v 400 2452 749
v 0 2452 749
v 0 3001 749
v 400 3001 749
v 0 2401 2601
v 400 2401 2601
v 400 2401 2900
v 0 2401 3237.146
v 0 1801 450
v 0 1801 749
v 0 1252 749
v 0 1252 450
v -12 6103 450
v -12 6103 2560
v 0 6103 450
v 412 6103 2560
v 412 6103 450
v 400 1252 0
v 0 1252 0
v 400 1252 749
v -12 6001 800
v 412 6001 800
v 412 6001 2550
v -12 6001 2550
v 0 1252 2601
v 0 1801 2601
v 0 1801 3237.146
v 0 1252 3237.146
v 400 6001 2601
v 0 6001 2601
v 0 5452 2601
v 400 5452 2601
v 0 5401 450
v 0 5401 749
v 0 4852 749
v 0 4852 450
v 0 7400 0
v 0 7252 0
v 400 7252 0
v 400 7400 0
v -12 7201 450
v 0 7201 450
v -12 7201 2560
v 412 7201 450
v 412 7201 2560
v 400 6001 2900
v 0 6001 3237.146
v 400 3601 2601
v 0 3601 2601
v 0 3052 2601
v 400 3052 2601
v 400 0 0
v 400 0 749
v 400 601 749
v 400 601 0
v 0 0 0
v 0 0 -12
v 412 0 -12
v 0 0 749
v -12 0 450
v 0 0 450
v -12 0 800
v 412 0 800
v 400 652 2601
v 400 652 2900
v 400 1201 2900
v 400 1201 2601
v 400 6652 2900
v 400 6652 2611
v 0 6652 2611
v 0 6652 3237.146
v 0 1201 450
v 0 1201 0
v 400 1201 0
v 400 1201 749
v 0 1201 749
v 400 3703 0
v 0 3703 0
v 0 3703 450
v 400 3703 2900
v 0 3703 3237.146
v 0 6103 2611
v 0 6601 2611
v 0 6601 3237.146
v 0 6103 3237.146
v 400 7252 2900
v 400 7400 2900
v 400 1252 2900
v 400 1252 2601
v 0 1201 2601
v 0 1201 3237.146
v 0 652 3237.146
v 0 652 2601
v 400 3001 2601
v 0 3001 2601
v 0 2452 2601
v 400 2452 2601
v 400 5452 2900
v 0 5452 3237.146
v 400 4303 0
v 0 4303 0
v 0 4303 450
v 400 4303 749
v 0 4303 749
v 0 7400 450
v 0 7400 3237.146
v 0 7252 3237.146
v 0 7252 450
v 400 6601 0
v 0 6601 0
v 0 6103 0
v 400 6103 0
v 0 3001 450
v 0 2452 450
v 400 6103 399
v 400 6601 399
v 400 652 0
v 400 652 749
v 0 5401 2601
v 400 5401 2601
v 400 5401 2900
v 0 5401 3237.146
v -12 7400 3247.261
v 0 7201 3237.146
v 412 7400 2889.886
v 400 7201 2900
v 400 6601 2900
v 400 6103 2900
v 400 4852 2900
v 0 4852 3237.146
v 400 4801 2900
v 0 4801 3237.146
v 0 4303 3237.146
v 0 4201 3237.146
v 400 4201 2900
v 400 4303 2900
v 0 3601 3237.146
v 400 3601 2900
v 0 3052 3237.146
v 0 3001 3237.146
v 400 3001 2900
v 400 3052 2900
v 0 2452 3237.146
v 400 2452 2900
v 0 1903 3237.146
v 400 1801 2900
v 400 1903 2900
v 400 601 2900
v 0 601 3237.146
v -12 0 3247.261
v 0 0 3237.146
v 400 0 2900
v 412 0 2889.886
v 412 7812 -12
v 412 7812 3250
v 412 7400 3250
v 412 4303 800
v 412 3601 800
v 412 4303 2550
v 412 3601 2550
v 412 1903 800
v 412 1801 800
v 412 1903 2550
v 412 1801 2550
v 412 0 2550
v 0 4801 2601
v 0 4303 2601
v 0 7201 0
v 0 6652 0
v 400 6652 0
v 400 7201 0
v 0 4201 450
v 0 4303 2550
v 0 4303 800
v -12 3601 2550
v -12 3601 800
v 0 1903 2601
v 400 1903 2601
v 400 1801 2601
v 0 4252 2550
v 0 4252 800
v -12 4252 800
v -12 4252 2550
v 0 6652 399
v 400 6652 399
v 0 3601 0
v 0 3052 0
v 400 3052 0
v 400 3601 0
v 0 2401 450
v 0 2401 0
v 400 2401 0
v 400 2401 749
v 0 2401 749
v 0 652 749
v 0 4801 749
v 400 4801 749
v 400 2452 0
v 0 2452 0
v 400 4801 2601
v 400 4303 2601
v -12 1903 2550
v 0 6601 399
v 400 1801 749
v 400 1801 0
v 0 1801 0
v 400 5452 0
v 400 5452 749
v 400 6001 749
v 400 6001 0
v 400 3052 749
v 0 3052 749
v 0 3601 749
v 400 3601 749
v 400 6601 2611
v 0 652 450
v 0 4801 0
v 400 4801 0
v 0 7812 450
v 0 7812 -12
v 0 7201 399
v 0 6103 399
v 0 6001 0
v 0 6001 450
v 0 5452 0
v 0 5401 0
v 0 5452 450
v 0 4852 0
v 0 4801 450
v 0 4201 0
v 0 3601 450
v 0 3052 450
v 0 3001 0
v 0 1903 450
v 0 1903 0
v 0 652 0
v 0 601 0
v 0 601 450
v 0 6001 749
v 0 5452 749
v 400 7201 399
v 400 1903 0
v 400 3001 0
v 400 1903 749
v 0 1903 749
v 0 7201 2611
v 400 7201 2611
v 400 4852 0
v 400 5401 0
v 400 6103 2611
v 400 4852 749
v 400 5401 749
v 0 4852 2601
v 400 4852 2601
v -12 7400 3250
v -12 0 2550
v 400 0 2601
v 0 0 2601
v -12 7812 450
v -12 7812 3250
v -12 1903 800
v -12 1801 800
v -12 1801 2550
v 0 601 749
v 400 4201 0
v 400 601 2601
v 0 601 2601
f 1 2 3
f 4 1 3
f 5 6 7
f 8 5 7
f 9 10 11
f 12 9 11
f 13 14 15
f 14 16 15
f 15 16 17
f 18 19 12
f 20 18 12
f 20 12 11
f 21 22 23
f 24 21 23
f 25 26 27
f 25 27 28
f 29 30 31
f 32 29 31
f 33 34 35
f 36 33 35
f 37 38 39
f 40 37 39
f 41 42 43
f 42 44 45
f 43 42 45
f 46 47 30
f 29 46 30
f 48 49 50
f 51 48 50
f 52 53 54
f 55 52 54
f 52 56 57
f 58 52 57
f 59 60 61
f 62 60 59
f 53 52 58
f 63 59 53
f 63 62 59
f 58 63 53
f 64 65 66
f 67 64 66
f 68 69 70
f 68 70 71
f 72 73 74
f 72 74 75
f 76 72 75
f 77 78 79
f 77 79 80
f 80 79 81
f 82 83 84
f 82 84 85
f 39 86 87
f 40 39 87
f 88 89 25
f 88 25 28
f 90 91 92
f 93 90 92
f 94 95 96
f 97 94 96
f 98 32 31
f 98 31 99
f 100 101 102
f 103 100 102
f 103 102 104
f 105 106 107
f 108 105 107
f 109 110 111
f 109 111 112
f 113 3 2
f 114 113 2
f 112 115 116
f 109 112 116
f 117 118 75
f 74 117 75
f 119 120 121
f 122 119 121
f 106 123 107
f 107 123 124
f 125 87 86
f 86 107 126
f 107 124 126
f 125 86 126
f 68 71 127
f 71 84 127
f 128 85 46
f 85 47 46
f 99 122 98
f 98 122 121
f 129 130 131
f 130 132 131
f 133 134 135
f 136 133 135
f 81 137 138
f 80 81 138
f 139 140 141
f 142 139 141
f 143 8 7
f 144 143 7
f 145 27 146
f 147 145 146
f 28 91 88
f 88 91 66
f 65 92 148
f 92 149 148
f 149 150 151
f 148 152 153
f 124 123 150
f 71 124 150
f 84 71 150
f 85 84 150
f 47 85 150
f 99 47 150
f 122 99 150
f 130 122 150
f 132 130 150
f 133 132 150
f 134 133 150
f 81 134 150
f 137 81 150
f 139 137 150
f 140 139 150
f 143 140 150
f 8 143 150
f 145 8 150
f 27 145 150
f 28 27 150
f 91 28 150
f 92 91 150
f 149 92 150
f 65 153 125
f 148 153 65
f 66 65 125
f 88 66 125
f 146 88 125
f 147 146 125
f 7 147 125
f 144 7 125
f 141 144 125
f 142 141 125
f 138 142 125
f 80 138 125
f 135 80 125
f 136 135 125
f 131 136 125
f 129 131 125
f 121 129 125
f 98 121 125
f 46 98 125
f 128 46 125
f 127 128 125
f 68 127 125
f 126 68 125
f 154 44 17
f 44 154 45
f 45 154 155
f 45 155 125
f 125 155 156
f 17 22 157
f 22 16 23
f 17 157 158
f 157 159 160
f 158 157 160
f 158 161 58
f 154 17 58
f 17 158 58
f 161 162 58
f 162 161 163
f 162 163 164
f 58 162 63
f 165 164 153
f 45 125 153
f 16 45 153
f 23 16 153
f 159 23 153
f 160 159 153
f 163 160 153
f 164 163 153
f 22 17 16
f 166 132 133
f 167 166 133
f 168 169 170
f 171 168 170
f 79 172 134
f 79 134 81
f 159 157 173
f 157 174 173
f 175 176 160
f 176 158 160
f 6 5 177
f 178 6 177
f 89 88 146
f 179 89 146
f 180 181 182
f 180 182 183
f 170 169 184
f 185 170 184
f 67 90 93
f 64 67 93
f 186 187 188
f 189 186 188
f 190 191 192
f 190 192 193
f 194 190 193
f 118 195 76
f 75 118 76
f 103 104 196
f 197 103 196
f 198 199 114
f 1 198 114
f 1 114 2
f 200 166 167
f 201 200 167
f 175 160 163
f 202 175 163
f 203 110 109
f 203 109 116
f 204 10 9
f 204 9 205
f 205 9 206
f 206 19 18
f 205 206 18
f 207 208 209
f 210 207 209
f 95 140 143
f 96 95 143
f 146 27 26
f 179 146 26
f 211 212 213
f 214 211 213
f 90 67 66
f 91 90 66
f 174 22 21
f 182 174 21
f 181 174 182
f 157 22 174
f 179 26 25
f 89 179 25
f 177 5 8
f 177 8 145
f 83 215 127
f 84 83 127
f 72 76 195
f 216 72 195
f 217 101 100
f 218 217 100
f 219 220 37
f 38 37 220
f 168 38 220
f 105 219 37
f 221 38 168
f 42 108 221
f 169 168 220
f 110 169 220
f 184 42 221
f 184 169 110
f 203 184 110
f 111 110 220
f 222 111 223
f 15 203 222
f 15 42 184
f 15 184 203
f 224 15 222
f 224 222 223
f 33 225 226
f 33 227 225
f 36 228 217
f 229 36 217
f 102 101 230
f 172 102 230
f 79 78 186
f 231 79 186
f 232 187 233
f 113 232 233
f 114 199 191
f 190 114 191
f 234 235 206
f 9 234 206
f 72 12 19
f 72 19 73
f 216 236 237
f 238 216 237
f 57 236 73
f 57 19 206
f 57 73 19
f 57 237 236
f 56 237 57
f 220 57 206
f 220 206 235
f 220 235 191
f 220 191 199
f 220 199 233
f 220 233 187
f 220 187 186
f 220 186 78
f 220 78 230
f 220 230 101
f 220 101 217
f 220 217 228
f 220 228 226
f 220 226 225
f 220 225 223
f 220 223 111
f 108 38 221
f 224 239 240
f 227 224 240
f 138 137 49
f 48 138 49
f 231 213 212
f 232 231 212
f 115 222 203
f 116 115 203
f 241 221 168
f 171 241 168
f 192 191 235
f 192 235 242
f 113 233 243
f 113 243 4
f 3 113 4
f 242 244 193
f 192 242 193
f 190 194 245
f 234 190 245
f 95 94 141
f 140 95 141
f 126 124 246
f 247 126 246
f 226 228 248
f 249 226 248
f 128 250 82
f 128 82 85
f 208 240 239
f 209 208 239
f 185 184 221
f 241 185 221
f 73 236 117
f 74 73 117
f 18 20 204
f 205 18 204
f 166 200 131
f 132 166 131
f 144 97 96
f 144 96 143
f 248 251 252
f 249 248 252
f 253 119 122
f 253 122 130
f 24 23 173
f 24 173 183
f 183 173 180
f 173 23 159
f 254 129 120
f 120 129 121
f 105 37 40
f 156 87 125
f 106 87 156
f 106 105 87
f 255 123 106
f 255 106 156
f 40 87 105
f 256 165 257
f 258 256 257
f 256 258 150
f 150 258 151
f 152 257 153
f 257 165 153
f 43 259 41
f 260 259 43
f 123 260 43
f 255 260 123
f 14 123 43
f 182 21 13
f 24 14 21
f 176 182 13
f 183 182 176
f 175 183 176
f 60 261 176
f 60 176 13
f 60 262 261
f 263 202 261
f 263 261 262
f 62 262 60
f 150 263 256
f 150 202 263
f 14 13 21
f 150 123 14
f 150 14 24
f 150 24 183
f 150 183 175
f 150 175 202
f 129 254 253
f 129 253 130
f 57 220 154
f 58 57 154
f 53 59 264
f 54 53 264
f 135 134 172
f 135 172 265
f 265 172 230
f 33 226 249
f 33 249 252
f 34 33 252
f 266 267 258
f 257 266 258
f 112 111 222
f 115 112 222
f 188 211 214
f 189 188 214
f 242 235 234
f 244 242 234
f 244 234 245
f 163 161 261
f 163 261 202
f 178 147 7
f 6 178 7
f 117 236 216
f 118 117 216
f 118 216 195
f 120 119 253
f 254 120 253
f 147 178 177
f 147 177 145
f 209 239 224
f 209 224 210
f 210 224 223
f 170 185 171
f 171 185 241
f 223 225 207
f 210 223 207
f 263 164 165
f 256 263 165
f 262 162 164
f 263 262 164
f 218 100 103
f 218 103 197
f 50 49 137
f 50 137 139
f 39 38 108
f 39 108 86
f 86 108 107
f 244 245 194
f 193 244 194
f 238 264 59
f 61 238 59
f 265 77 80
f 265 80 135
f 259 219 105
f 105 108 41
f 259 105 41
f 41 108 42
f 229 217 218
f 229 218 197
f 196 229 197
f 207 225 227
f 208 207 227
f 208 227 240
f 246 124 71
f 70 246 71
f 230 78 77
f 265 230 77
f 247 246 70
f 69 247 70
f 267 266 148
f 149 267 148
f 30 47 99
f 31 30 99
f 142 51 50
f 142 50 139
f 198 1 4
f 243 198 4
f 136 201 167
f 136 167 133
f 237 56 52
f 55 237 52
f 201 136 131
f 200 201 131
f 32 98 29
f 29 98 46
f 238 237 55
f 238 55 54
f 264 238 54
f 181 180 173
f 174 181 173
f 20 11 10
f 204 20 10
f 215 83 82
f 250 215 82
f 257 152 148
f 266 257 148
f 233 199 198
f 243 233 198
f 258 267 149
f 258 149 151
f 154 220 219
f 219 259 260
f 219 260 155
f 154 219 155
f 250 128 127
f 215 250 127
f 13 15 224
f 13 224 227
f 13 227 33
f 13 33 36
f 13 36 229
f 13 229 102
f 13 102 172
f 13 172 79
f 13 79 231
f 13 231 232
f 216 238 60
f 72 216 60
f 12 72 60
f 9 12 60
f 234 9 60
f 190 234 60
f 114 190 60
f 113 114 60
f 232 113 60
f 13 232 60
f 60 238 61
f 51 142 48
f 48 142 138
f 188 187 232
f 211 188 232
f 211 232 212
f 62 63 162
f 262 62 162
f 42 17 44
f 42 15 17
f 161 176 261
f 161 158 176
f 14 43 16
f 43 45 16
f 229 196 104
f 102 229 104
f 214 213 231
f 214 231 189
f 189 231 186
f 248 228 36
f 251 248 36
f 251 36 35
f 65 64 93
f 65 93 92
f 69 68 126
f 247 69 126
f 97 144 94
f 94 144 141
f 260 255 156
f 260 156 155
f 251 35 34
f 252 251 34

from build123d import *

# Parameters (mm, degrees)
F0_W     = 51
F0_H     = 649
F0_H_2   = 749
F0_H_3   = 3250
F1_DEPTH = 400
F0_H_4   = 399
F0_H_5   = 639
F0_H_6   = 51
F0_H_7   = 1750
F0_W_2   = 412
F2_W     = 601
F2_H     = 749
F2_W_2   = 549
F2_W_3   = 498
F2_H_2   = 649
F2_W_4   = 1698
F2_H_3   = 1750
F2_W_5   = 4109
F2_H_4   = 3250
F2_W_6   = 1098
F2_H_5   = 2110
F3_DEPTH = 12
F4_W     = 549
F4_H     = 649
F4_W_2   = 498
F4_W_3   = 601
F4_H_2   = 299
F4_W_4   = 1749
F4_H_3   = 1750
F4_W_5   = 1698
F5_DEPTH = 12
F6_W     = 412
F6_H     = 7812
F7_DEPTH = 12
F9_DEPTH = 7400


# Not quite as in the source:
# - a feature names something its author has since deleted; it is built from what else it names


with BuildPart() as f1:
    # F0 (on Right) → F1 (new body)
    with BuildSketch(Plane.YZ):
        with Locations((626.5, 2925.5)):
            Rectangle(F0_W, F0_H)
        with Locations((1226.5, 374.5)):
            Rectangle(F0_W, F0_H_2)
        with Locations((3026.5, 374.5)):
            Rectangle(F0_W, F0_H_2)
        with Locations((1226.5, 2925.5)):
            Rectangle(F0_W, F0_H)
        Polygon((1801, 2550), (1801, 800), (1801, 749), (1801, 0), (1852, 0), (1852, 3250), (1801, 3250), (1801, 2601), align=None)
        with Locations((3026.5, 2925.5)):
            Rectangle(F0_W, F0_H)
        Polygon((3601, 2550), (3601, 800), (3601, 749), (3601, 0), (3652, 0), (3652, 3250), (3601, 3250), (3601, 2601), align=None)
        Polygon((0, 800), (0, 749), (601, 749), (652, 749), (1201, 749), (1252, 749), (1801, 749), (1801, 800), align=None)
        Polygon((0, 2601), (0, 2550), (1801, 2550), (1801, 2601), (1252, 2601), (1201, 2601), (652, 2601), (601, 2601), align=None)
        with Locations((626.5, 374.5)):
            Rectangle(F0_W, F0_H_2)
        Polygon((1852, 3250), (1852, 0), (1903, 0), (1903, 749), (1903, 800), (1903, 2550), (1903, 2601), (1903, 3250), align=None)
        Polygon((1903, 800), (1903, 749), (2401, 749), (2452, 749), (3001, 749), (3052, 749), (3601, 749), (3601, 800), align=None)
        with Locations((2426.5, 374.5)):
            Rectangle(F0_W, F0_H_2)
        with Locations((2426.5, 2925.5)):
            Rectangle(F0_W, F0_H)
        Polygon((2401, 2601), (1903, 2601), (1903, 2550), (3601, 2550), (3601, 2601), (3052, 2601), (3001, 2601), (2452, 2601), align=None)
        with Locations((3677.5, 1625)):
            Rectangle(F0_W, F0_H_3)
    extrude(amount=F1_DEPTH)



with BuildPart() as f1b:
    # F0 (on Right) → F1, piece 2 (new body)
    with BuildSketch(Plane.YZ):
        with Locations((4826.5, 374.5)):
            Rectangle(F0_W, F0_H_2)
        Polygon((6001, 2550), (6001, 800), (6001, 749), (6001, 0), (6052, 0), (6052, 749), (6052, 2601), (6052, 3250), (6001, 3250), (6001, 2601), align=None)
        with Locations((6626.5, 199.5)):
            Rectangle(F0_W, F0_H_4)
        with Locations((6626.5, 2930.5)):
            Rectangle(F0_W, F0_H_5)
        Polygon((4201, 3250), (4201, 0), (4252, 0), (4252, 749), (4252, 800), (4252, 2550), (4252, 2601), (4252, 3250), align=None)
        with Locations((5426.5, 2925.5)):
            Rectangle(F0_W, F0_H)
        Polygon((7201, 399), (7201, 0), (7252, 0), (7252, 3250), (7201, 3250), (7201, 2611), (7201, 2560), (7201, 450), align=None)
        with Locations((4277.5, 774.5)):
            Rectangle(F0_W, F0_H_6)
        Polygon((4303, 800), (4303, 749), (4801, 749), (4852, 749), (5401, 749), (5452, 749), (6001, 749), (6001, 800), align=None)
        Polygon((6601, 2611), (6103, 2611), (6103, 2560), (7201, 2560), (7201, 2611), (6652, 2611), align=None)
        Polygon((6103, 450), (6103, 399), (6601, 399), (6652, 399), (7201, 399), (7201, 450), align=None)
        with Locations((5426.5, 374.5)):
            Rectangle(F0_W, F0_H_2)
        Polygon((6052, 749), (6052, 0), (6103, 0), (6103, 399), (6103, 450), (6103, 2560), (6103, 2611), (6103, 3250), (6052, 3250), (6052, 2601), align=None)
        with Locations((4826.5, 2925.5)):
            Rectangle(F0_W, F0_H)
        Polygon((4801, 2601), (4303, 2601), (4303, 2550), (6001, 2550), (6001, 2601), (5452, 2601), (5401, 2601), (4852, 2601), align=None)
        with Locations((4277.5, 2925.5)):
            Rectangle(F0_W, F0_H)
        with Locations((4277.5, 1675)):
            Rectangle(F0_W, F0_H_7)
        with Locations((4277.5, 2575.5)):
            Rectangle(F0_W, F0_H_6)
        with Locations((4277.5, 374.5)):
            Rectangle(F0_W, F0_H_2)
    extrude(amount=F1_DEPTH)


with BuildPart() as f1c:
    # F0 (on Right) → F1, piece 3 (new body)
    with BuildSketch(Plane.YZ):
        with Locations((7606, 1625)):
            Rectangle(F0_W_2, F0_H_3)
    extrude(amount=F1_DEPTH)


with BuildPart() as f1_1:
    add(f1.part)

    add(f1b.part)  # F3 merges F1b

    add(f1c.part)  # F3 merges F1c
    # F2 (on face) → F3 (join)
    with BuildSketch(Plane.YZ.offset(400)):
        with Locations((300.5, 374.5)):
            Rectangle(F2_W, F2_H)
        with Locations((926.5, 374.5)):
            Rectangle(F2_W_2, F2_H)
        with Locations((1526.5, 374.5)):
            Rectangle(F2_W_2, F2_H)
        with Locations((2152, 374.5)):
            Rectangle(F2_W_3, F2_H)
        with Locations((2726.5, 374.5)):
            Rectangle(F2_W_2, F2_H)
        with Locations((3326.5, 374.5)):
            Rectangle(F2_W_2, F2_H)
        with Locations((300.5, 2925.5)):
            Rectangle(F2_W, F2_H_2)
        with Locations((926.5, 2925.5)):
            Rectangle(F2_W_2, F2_H_2)
        with Locations((1526.5, 2925.5)):
            Rectangle(F2_W_2, F2_H_2)
        with Locations((2152, 2925.5)):
            Rectangle(F2_W_3, F2_H_2)
        with Locations((2726.5, 2925.5)):
            Rectangle(F2_W_2, F2_H_2)
        with Locations((3326.5, 2925.5)):
            Rectangle(F2_W_2, F2_H_2)
        Polygon((601, 749), (601, 0), (652, 0), (652, 749), (1201, 749), (1201, 0), (1252, 0), (1252, 749), (1801, 749), (1801, 0), (1903, 0), (1903, 749), (2401, 749), (2401, 0), (2452, 0), (2452, 749), (3001, 749), (3001, 0), (3052, 0), (3052, 749), (3601, 749), (3601, 0), (3703, 0), (3703, 3250), (3601, 3250), (3601, 2601), (3052, 2601), (3052, 3250), (3001, 3250), (3001, 2601), (2452, 2601), (2452, 3250), (2401, 3250), (2401, 2601), (1903, 2601), (1903, 3250), (1801, 3250), (1801, 2601), (1252, 2601), (1252, 3250), (1201, 3250), (1201, 2601), (652, 2601), (652, 3250), (601, 3250), (601, 2601), (0, 2601), (0, 2550), (1801, 2550), (1801, 800), (0, 800), (0, 749), align=None)
        with Locations((2752, 1675)):
            Rectangle(F2_W_4, F2_H_3, mode=Mode.SUBTRACT)
        with Locations((5757.5, 1625)):
            Rectangle(F2_W_5, F2_H_4)
        with Locations((6652, 1505)):
            Rectangle(F2_W_6, F2_H_5, mode=Mode.SUBTRACT)
        with Locations((5152, 1675)):
            Rectangle(F2_W_4, F2_H_3, mode=Mode.SUBTRACT)
    extrude(amount=F3_DEPTH)

    # F4 (on face) → F5 (join)
    with BuildSketch(Plane(origin=(0, 0, 0), x_dir=(0, -1, 0), z_dir=(-1, 0, 0))):
        with Locations((-3326.5, 2925.5)):
            Rectangle(F4_W, F4_H)
        with Locations((-2726.5, 2925.5)):
            Rectangle(F4_W, F4_H)
        with Locations((-2152, 2925.5)):
            Rectangle(F4_W_2, F4_H)
        with Locations((-1526.5, 2925.5)):
            Rectangle(F4_W, F4_H)
        with Locations((-926.5, 2925.5)):
            Rectangle(F4_W, F4_H)
        with Locations((-300.5, 2925.5)):
            Rectangle(F4_W_3, F4_H)
        with Locations((-300.5, 599.5)):
            Rectangle(F4_W_3, F4_H_2)
        Polygon((-3703, 450), (-3703, 3250), (-7812, 3250), (-7812, 450), (-7201, 450), (-7201, 2560), (-6103, 2560), (-6103, 450), align=None)
        with Locations((-5126.5, 1675)):
            Rectangle(F4_W_4, F4_H_3, mode=Mode.SUBTRACT)
        with Locations((-3326.5, 599.5)):
            Rectangle(F4_W, F4_H_2)
        with Locations((-2726.5, 599.5)):
            Rectangle(F4_W, F4_H_2)
        with Locations((-2152, 599.5)):
            Rectangle(F4_W_2, F4_H_2)
        with Locations((-1526.5, 599.5)):
            Rectangle(F4_W, F4_H_2)
        with Locations((-926.5, 599.5)):
            Rectangle(F4_W, F4_H_2)
        Polygon((-1801, 800), (-1801, 2550), (0, 2550), (0, 2601), (-601, 2601), (-601, 3250), (-652, 3250), (-652, 2601), (-1201, 2601), (-1201, 3250), (-1252, 3250), (-1252, 2601), (-1801, 2601), (-1801, 3250), (-1903, 3250), (-1903, 2601), (-2401, 2601), (-2401, 3250), (-2452, 3250), (-2452, 2601), (-3001, 2601), (-3001, 3250), (-3052, 3250), (-3052, 2601), (-3601, 2601), (-3601, 3250), (-3703, 3250), (-3703, 450), (-3601, 450), (-3601, 749), (-3052, 749), (-3052, 450), (-3001, 450), (-3001, 749), (-2452, 749), (-2452, 450), (-2401, 450), (-2401, 749), (-1903, 749), (-1903, 450), (-1801, 450), (-1801, 749), (-1252, 749), (-1252, 450), (-1201, 450), (-1201, 749), (-652, 749), (-652, 450), (-601, 450), (-601, 749), (0, 749), (0, 800), align=None)
        with Locations((-2752, 1675)):
            Rectangle(F4_W_5, F4_H_3, mode=Mode.SUBTRACT)
    extrude(amount=F5_DEPTH)

    # F6 (on face) → F7 (join)
    with BuildSketch(Plane(origin=(0, 0, 0), x_dir=(1, 0, 0), z_dir=(0, 0, -1))):
        with Locations((206, -3906)):
            Rectangle(F6_W, F6_H)
    extrude(amount=F7_DEPTH)

    # F8 (on face) → F9 (cut)
    with BuildSketch(Plane.XZ):
        Polygon((0, 3237.1461581129), (400, 2900), (515.7678202297, 2802.4233104411), (515.7678202297, 3337.787177324), (-119.4034299835, 3337.787177324), (-12, 3247.2605428563), align=None)
    extrude(amount=-F9_DEPTH, mode=Mode.SUBTRACT)


solid = f1_1.part
